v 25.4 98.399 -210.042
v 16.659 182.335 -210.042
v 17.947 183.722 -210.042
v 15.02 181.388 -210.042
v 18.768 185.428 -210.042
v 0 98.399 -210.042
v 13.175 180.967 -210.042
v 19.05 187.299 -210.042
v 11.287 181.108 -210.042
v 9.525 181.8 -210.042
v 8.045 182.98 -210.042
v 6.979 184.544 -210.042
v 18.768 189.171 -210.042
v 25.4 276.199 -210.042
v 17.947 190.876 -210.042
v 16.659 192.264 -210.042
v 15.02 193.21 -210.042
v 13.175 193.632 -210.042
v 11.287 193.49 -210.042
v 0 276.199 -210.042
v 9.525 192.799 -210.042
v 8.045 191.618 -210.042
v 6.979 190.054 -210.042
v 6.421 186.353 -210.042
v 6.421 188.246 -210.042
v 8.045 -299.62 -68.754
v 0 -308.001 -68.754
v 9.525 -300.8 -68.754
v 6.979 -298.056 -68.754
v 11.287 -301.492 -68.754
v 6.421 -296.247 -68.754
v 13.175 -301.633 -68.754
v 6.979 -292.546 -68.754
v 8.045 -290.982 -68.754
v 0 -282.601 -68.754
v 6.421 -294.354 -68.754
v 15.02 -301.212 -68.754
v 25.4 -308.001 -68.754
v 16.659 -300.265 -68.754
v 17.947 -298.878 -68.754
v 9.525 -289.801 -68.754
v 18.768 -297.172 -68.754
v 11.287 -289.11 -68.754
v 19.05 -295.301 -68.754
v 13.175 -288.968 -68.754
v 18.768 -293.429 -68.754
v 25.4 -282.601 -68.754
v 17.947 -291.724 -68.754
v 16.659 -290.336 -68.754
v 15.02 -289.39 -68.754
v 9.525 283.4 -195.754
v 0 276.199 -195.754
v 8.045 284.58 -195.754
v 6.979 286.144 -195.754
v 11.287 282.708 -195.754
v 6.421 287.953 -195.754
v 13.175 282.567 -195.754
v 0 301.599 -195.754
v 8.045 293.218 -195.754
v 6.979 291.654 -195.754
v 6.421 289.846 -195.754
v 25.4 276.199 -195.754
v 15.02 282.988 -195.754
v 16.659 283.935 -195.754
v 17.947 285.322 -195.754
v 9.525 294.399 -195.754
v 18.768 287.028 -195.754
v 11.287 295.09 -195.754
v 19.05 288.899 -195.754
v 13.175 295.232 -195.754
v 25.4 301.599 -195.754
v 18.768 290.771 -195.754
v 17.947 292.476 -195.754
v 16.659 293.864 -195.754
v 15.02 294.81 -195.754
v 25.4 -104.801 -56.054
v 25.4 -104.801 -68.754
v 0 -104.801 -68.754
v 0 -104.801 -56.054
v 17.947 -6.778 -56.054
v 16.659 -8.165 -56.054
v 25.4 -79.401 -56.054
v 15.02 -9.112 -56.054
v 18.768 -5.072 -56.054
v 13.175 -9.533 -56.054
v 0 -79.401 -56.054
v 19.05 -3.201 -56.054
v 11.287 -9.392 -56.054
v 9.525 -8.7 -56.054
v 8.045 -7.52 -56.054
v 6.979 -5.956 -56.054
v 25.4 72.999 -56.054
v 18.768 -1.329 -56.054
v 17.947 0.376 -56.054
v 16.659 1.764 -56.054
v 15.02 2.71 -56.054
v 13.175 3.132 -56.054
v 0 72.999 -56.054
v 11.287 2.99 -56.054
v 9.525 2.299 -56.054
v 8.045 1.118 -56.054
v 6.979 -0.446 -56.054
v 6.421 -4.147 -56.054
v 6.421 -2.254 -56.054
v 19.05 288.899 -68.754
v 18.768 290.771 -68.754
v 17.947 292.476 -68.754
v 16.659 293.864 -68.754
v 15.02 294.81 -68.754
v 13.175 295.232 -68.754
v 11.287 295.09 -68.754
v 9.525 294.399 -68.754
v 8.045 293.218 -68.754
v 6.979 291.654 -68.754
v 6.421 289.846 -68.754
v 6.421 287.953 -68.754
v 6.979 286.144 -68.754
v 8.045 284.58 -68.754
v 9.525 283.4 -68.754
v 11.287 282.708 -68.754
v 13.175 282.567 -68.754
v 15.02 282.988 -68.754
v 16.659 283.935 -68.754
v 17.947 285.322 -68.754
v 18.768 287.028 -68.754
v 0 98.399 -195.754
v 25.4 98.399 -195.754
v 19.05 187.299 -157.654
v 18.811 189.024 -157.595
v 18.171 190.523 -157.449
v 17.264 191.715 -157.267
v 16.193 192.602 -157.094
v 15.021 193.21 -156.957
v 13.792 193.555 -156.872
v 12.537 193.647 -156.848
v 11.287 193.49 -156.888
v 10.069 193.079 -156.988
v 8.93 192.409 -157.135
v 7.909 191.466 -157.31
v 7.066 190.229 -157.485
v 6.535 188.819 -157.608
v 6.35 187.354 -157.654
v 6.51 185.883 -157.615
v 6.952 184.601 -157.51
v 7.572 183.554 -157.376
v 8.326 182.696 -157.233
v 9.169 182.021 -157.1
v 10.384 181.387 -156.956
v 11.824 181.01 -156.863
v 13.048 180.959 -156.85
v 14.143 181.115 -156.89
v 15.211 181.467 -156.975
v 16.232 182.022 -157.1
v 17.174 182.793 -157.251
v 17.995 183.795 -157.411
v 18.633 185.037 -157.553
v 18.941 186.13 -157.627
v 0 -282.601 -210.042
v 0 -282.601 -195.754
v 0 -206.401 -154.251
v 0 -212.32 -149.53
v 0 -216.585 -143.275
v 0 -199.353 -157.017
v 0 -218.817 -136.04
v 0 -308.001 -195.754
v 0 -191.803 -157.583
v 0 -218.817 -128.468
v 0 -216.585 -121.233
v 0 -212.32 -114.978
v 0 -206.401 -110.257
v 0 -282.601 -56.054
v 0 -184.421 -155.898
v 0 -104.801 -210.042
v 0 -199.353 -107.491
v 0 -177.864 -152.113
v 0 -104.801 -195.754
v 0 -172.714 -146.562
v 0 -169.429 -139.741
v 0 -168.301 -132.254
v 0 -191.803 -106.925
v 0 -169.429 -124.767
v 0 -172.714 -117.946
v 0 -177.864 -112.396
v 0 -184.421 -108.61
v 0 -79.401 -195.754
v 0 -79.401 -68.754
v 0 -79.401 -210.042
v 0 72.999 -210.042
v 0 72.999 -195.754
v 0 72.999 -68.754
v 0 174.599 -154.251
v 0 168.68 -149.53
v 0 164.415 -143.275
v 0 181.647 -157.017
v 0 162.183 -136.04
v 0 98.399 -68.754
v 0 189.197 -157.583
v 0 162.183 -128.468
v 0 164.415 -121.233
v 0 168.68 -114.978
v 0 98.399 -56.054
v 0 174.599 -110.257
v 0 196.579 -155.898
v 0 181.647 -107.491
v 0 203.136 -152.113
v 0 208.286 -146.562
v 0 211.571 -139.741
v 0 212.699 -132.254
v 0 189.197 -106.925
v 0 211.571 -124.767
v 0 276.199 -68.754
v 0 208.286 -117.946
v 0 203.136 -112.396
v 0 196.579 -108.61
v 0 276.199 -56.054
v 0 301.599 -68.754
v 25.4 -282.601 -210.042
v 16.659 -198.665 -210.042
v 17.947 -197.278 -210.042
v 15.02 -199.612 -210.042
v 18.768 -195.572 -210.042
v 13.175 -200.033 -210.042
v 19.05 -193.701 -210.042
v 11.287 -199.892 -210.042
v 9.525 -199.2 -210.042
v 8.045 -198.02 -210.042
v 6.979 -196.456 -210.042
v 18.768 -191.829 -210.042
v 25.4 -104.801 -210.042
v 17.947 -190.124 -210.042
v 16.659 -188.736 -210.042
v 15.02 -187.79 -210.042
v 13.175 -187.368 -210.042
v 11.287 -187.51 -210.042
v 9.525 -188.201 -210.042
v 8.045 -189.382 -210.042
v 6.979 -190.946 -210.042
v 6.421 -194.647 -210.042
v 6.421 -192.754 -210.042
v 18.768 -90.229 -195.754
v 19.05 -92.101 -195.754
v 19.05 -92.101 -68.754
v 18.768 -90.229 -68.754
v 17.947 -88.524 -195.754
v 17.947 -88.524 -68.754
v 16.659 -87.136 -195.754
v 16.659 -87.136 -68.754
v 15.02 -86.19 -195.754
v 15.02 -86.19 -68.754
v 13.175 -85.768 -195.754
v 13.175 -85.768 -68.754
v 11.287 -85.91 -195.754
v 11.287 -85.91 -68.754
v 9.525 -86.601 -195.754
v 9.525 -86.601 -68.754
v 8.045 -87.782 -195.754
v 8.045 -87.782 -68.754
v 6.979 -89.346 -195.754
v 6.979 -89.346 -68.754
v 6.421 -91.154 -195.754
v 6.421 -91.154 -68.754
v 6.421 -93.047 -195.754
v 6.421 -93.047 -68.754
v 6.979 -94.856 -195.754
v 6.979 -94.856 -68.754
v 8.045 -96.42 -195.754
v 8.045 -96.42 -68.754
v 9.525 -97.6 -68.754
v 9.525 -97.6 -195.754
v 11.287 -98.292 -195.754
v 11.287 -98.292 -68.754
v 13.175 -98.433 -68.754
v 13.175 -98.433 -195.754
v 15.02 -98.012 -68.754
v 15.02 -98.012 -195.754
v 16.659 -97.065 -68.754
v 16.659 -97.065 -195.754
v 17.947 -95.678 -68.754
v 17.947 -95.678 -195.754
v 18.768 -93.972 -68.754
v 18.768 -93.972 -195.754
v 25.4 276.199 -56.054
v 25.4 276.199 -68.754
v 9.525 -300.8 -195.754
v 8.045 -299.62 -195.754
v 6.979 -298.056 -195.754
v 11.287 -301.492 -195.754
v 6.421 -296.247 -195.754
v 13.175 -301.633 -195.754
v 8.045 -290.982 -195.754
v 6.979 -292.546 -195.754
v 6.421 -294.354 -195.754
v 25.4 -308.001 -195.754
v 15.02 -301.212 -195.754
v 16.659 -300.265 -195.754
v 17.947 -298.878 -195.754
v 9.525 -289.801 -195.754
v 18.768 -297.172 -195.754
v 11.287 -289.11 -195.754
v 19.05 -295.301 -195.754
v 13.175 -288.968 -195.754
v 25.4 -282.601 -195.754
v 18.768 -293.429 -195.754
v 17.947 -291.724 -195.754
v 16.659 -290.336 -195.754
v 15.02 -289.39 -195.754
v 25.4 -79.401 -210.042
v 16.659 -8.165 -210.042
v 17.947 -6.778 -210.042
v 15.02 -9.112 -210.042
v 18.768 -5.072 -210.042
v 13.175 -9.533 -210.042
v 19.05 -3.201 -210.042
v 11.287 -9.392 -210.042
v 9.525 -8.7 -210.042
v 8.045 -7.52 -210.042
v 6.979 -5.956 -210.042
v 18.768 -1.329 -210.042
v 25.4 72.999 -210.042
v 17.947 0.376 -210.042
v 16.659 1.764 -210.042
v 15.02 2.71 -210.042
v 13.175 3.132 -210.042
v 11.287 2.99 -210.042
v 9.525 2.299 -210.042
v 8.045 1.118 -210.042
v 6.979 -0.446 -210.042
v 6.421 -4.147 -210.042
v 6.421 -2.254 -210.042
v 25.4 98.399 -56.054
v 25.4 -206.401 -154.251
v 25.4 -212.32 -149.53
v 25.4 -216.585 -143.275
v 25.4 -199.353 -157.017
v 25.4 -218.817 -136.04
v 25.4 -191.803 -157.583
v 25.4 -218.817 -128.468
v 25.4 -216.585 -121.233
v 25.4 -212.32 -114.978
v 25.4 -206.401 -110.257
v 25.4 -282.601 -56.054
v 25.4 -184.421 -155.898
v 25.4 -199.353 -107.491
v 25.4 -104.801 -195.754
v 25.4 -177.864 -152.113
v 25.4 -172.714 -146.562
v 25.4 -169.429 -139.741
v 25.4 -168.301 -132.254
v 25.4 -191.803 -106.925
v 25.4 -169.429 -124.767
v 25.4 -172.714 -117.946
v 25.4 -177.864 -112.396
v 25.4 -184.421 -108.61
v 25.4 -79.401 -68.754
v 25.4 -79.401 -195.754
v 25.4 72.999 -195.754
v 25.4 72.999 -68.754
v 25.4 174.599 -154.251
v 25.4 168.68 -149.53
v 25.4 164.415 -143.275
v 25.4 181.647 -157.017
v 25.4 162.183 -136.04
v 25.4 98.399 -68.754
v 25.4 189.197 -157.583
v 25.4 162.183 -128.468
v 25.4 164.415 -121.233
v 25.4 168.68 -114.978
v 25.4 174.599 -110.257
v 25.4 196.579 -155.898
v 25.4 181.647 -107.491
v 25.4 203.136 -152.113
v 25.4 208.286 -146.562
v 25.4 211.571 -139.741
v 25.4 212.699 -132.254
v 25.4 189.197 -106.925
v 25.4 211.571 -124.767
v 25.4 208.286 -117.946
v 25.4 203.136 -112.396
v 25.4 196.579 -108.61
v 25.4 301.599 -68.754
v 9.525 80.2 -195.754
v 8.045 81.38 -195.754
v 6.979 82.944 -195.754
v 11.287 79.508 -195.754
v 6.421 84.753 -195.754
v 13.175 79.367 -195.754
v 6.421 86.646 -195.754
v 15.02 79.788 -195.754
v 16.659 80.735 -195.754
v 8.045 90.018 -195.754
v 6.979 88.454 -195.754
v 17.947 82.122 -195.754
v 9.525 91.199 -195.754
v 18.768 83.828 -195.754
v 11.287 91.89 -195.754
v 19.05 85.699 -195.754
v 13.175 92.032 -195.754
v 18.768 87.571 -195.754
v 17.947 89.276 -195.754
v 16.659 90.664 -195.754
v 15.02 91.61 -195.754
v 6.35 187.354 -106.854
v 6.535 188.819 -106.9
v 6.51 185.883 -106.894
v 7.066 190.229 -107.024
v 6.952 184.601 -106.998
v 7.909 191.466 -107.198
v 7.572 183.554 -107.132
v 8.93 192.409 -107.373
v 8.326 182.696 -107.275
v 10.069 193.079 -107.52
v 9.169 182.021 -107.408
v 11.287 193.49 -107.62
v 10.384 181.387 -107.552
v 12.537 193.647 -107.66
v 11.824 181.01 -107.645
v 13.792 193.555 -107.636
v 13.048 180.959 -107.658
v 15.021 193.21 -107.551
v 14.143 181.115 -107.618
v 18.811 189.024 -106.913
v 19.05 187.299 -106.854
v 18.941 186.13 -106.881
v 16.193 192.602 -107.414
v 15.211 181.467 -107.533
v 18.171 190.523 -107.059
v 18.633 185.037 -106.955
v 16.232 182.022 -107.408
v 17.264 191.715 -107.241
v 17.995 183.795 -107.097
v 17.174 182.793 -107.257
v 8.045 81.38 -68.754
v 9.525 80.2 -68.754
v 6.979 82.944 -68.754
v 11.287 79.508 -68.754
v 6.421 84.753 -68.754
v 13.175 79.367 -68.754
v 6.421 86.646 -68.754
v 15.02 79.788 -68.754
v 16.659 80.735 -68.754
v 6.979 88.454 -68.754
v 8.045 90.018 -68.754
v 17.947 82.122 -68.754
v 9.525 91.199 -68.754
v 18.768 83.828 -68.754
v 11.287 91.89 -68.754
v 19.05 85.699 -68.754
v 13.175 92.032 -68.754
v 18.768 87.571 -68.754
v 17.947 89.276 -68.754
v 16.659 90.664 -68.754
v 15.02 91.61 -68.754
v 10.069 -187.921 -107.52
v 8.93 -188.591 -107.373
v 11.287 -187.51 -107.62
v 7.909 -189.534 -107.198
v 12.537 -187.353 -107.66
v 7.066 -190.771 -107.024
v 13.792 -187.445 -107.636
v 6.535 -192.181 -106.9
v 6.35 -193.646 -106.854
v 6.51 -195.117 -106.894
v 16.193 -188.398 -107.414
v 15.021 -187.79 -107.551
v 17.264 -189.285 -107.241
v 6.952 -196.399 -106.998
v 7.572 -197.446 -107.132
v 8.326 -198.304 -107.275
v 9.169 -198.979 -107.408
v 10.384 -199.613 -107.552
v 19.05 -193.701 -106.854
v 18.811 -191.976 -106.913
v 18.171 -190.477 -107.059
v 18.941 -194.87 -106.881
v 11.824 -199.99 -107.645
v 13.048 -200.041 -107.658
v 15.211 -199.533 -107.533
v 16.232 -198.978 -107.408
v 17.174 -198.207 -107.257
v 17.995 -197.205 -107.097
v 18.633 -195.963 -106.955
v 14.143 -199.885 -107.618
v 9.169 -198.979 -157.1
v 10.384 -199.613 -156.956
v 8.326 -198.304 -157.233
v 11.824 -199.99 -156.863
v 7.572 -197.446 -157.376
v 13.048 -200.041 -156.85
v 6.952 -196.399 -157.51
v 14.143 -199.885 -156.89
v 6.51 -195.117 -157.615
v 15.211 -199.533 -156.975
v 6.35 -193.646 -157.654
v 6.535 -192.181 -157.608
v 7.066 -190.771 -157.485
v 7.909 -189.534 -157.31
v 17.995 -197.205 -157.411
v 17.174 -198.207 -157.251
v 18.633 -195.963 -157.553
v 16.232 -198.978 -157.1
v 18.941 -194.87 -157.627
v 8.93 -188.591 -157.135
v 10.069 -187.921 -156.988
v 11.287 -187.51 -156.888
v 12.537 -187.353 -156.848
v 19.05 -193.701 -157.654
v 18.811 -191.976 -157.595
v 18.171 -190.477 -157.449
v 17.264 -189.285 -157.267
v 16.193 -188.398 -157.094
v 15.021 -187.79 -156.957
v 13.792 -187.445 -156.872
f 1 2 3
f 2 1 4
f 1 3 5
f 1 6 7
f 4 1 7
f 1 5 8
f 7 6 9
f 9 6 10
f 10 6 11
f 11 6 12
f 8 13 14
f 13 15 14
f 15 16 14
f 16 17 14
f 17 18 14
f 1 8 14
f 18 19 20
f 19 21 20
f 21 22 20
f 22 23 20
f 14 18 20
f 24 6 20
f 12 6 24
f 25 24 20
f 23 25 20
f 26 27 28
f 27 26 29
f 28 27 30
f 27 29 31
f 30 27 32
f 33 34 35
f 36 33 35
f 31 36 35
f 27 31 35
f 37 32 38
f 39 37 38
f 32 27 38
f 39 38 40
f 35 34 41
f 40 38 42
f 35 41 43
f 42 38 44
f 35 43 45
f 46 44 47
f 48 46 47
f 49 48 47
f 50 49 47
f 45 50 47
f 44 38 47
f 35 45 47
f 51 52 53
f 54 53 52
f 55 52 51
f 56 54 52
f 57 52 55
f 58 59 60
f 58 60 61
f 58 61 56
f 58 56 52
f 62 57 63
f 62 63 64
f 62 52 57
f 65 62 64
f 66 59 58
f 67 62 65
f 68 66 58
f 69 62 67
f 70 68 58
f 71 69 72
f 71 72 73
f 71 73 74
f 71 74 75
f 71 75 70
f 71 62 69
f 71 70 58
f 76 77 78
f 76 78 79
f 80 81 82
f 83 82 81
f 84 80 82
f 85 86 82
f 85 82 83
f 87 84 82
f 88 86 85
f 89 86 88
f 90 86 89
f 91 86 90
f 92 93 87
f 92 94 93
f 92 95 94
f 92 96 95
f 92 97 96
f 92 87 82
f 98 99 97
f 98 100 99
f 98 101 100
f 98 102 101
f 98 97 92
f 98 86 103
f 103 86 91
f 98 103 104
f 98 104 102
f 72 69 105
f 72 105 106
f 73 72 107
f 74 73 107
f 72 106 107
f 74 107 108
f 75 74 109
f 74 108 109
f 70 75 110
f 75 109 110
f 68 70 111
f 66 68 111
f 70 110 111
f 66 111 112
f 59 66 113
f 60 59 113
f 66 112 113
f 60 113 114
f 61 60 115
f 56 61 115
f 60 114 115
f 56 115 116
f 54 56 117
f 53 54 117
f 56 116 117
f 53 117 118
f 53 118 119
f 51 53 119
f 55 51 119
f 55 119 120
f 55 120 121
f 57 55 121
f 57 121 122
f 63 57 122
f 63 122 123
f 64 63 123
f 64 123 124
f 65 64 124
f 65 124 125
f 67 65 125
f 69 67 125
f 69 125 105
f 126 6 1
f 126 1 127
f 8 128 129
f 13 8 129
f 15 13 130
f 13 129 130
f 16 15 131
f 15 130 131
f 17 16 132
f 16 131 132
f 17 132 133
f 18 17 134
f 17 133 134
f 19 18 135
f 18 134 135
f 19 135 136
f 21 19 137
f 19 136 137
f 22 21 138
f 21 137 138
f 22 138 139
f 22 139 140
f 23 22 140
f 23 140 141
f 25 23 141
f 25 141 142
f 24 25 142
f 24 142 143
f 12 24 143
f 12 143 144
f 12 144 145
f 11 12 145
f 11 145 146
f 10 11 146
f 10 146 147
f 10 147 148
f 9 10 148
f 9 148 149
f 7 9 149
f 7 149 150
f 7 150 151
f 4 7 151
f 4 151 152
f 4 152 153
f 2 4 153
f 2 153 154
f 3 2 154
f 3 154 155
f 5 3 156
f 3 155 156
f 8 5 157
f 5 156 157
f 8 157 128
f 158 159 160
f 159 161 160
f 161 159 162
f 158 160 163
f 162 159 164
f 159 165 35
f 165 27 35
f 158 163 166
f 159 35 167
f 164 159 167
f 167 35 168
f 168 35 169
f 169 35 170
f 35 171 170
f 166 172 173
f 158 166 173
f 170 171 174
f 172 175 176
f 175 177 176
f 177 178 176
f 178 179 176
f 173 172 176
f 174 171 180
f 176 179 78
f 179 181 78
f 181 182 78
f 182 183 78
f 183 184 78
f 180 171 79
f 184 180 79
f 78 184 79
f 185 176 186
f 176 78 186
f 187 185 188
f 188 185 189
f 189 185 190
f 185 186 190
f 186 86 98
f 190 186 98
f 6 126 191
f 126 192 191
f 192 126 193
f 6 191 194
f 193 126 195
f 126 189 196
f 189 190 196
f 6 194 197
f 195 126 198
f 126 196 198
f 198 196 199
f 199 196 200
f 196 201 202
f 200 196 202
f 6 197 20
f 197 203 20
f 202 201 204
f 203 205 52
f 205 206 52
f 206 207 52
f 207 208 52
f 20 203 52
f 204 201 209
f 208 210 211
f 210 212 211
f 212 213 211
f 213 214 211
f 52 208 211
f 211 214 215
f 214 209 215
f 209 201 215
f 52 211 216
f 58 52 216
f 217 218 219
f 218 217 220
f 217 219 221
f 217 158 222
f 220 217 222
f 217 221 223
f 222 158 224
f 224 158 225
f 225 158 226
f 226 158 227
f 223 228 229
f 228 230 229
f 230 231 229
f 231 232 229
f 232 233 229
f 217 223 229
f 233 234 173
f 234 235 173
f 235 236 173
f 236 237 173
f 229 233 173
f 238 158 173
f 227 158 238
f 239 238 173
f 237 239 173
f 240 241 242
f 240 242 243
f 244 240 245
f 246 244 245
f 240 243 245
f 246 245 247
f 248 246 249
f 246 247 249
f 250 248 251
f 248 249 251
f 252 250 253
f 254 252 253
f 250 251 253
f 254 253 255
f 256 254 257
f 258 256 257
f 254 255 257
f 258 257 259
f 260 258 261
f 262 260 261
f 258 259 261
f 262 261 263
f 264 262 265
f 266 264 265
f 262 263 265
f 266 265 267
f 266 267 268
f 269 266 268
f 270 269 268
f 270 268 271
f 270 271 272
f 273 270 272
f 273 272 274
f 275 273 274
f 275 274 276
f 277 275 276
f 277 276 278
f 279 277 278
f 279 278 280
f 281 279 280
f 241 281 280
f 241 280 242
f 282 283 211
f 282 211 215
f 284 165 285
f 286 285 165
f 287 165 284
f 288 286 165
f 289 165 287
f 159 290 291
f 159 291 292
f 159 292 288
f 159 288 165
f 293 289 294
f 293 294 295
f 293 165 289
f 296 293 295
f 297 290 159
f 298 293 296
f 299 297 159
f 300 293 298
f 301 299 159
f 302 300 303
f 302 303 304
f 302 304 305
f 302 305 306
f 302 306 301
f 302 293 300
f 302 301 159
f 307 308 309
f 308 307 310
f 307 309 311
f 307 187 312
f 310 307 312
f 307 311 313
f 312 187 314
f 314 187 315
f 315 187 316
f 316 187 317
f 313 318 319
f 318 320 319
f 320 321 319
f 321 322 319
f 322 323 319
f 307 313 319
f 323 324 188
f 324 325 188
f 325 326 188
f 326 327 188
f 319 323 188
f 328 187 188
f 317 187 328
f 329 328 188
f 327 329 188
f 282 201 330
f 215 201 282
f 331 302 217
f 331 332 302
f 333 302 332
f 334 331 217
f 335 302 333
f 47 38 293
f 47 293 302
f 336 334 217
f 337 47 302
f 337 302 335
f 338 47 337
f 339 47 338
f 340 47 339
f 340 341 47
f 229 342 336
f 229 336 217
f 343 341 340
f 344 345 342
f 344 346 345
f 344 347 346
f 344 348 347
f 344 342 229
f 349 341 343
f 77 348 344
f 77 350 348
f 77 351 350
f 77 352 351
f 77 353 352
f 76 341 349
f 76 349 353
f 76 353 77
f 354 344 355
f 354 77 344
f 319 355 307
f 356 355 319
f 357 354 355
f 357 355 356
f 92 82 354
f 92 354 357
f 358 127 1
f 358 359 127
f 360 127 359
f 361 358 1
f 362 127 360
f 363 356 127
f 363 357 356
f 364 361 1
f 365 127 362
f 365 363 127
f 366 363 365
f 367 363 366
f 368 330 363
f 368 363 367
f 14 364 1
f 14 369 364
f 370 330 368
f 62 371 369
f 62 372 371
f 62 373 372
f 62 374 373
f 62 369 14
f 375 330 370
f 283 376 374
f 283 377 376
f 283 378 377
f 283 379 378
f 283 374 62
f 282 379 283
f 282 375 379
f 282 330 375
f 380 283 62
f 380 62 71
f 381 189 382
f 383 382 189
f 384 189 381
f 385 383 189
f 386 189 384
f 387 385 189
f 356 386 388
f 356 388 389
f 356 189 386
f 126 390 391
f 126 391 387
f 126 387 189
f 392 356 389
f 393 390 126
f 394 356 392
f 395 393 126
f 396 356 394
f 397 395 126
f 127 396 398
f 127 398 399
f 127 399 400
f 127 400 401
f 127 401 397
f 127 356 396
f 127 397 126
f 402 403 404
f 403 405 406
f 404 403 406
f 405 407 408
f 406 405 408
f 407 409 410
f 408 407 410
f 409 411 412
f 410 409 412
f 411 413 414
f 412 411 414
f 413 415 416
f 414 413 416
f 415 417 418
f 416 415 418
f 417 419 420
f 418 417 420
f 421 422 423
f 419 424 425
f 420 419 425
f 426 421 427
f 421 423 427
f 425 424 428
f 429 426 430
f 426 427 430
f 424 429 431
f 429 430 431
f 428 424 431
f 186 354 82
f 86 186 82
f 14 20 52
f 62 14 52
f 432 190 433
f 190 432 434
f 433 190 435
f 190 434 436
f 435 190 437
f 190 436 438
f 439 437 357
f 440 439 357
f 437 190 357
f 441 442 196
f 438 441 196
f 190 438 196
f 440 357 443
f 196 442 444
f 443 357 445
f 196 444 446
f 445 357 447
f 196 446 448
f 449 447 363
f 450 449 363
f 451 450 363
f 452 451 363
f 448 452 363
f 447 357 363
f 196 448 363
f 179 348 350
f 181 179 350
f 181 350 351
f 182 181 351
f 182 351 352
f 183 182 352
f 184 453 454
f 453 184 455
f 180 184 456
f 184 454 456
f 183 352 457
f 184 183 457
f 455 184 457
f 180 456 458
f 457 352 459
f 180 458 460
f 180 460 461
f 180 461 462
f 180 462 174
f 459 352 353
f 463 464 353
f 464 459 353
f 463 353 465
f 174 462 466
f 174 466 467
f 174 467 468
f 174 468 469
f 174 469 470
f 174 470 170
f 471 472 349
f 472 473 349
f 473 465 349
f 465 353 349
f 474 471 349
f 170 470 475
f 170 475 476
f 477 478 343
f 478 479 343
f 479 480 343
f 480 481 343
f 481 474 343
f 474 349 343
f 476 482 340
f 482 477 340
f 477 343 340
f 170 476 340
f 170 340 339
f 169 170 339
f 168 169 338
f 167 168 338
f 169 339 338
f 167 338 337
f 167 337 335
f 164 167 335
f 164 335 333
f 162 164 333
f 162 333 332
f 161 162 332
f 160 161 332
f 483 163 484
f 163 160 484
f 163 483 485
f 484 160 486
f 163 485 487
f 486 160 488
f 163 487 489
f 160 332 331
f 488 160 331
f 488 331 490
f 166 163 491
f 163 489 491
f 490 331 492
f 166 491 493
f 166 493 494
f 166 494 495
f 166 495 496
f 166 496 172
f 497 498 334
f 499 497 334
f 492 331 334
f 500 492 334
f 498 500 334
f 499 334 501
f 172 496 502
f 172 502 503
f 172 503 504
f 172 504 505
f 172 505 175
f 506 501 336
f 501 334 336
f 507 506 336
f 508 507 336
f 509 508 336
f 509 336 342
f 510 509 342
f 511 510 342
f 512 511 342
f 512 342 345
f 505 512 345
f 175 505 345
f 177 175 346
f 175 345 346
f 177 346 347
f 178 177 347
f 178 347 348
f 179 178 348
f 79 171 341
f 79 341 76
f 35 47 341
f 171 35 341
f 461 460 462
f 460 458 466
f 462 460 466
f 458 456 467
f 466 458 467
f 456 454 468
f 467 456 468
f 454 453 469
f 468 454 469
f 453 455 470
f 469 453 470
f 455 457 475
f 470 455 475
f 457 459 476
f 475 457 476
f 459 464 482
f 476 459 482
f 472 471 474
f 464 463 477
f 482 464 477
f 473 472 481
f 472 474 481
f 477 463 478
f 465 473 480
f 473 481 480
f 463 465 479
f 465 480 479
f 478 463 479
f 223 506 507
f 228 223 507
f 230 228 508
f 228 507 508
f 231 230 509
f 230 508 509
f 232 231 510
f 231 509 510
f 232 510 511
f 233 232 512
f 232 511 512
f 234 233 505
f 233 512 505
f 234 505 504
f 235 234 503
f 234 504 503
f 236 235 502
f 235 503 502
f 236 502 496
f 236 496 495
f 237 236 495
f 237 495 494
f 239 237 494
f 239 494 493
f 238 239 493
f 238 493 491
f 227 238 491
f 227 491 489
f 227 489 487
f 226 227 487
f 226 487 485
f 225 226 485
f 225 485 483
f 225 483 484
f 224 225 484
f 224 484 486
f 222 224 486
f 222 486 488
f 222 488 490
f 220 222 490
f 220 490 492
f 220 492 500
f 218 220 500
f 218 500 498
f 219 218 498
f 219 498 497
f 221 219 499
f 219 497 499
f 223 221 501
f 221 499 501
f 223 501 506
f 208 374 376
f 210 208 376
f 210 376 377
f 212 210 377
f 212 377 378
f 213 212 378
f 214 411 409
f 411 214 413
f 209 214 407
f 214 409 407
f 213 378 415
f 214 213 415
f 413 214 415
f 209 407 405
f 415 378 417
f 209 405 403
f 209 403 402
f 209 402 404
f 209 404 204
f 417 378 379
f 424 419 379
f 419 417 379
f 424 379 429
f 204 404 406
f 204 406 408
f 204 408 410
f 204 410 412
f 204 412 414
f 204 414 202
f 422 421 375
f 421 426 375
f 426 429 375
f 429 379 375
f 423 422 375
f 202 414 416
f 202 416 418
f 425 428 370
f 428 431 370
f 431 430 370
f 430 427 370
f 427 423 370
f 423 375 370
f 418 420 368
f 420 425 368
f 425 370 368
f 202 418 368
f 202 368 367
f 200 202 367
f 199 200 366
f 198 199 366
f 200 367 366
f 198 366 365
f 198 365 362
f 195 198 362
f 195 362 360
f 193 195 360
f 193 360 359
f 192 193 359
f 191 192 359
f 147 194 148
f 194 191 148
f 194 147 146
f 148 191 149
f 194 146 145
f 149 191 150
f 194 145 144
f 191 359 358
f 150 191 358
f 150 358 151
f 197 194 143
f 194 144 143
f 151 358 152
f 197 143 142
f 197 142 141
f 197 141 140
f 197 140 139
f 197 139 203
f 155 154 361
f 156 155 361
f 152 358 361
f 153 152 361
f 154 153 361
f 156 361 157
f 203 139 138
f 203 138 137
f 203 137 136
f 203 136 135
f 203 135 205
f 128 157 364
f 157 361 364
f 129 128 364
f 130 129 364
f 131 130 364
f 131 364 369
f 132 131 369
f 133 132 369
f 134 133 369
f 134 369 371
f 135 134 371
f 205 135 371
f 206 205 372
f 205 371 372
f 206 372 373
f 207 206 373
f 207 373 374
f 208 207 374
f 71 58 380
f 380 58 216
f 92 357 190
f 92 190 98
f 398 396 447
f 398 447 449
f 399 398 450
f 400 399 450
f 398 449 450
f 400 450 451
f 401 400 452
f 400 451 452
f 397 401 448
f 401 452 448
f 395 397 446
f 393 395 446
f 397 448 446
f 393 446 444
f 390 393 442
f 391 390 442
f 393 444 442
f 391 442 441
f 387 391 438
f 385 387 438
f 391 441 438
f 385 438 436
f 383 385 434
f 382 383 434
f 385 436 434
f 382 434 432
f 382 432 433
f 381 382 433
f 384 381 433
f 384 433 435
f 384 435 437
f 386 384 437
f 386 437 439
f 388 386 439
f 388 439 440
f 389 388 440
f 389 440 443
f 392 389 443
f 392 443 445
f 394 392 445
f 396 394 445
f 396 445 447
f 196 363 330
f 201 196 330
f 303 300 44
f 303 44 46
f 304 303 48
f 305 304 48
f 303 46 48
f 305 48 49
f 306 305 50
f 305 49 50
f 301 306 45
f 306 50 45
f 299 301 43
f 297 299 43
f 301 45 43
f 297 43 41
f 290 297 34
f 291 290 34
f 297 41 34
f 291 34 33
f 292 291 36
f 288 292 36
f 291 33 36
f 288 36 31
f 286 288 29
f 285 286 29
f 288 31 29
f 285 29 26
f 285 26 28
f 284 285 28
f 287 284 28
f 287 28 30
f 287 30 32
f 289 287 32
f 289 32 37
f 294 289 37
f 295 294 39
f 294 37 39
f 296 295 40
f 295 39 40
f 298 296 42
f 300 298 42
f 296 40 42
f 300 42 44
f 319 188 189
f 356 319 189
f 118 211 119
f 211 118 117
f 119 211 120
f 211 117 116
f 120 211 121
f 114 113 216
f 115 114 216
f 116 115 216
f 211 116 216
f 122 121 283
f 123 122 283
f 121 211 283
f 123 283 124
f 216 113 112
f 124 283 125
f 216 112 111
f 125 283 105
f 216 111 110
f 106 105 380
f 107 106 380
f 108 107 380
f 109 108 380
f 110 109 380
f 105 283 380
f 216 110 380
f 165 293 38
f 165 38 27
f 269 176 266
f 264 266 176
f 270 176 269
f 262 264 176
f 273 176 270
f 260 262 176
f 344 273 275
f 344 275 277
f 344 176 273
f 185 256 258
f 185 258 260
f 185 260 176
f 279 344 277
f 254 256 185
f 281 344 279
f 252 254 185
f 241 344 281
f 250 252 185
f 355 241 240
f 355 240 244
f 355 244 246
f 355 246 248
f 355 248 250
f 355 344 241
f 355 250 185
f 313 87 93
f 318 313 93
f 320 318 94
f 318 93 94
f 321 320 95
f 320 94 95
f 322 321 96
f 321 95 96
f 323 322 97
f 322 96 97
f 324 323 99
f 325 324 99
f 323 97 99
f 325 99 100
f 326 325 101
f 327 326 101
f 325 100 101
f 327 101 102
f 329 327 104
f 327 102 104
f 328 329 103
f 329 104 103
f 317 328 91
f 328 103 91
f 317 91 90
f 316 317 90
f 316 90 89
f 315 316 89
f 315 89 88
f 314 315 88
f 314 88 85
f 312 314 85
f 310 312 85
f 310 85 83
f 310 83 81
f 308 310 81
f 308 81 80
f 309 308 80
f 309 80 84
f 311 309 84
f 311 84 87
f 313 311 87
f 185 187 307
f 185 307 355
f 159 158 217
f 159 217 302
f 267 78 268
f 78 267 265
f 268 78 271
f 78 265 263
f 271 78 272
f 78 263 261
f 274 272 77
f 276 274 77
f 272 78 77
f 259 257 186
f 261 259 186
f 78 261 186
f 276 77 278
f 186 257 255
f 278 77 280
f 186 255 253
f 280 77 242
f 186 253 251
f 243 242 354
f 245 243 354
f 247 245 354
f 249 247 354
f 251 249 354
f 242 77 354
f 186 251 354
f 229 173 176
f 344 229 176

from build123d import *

# Parameters (mm, degrees)
F0_W      = 609.6
F0_H      = 153.9875
F1_DEPTH  = 25.4
F2_W      = 25.4
F2_H      = 12.7
F2_H_2    = 15.875
F3_DEPTH  = 25.4
F7_R      = 6.35
F6_R      = 6.35
F5_R      = 6.35
F4_R      = 6.35
F8_DEPTH  = 177.8
F9_DEPTH  = 1.5875
F12_R     = 6.35
F11_R     = 6.35
F10_R     = 6.35
F13_DEPTH = 177.8
F14_R     = 25.4
F15_DEPTH = 25.4
F16_DEPTH = 76.2
F17_DEPTH = 25.4


with BuildPart() as f1:
    # F0 (on Right) → F1 (new body)
    with BuildSketch(Plane.YZ):
        with Locations((-3.2007116824, -133.0477804439)):
            Rectangle(F0_W, F0_H)
    extrude(amount=F1_DEPTH)

    # F2 (on face) → F3 (cut)
    with BuildSketch(Plane.YZ.offset(25.4)):
        with Locations((-295.3007116824, -62.4040304439)):
            Rectangle(F2_W, F2_H)
        with Locations((-295.3007116824, -202.1040304439)):
            Rectangle(F2_W, F2_H_2)
        with Locations((-92.1007116824, -202.1040304439)):
            Rectangle(F2_W, F2_H_2)
        with Locations((-92.1007116824, -62.4040304439)):
            Rectangle(F2_W, F2_H)
        with Locations((85.6992883176, -62.4040304439)):
            Rectangle(F2_W, F2_H)
        with Locations((85.6992883176, -202.1040304439)):
            Rectangle(F2_W, F2_H_2)
        with Locations((288.8992883176, -62.4040304439)):
            Rectangle(F2_W, F2_H)
        with Locations((288.8992883176, -202.1040304439)):
            Rectangle(F2_W, F2_H_2)
    extrude(amount=-F3_DEPTH, mode=Mode.SUBTRACT)

    # F7 (on face) + F6 (on face) + F5 (on face) + F4 (on face) → F8 (cut)
    with BuildSketch(Plane.XY.offset(-68.7540304439)):
        with Locations((12.7, 288.8992883176)):
            Circle(F7_R)
    with BuildSketch(Plane.XY.offset(-68.7540304439)):
        with Locations((12.7, 85.6992883176)):
            Circle(F6_R)
    with BuildSketch(Plane.XY.offset(-68.7540304439)):
        with Locations((12.7, -92.1007116824)):
            Circle(F5_R)
    with BuildSketch(Plane.XY.offset(-68.7540304439)):
        with Locations((12.7, -295.3007116824)):
            Circle(F4_R)
    extrude(amount=-F8_DEPTH, mode=Mode.SUBTRACT)

    # F9 (add): faces of the model
    f9_faces = [f1.faces().sort_by_distance(p)[0] for p in [
        (12.7, -282.9599219273, -194.1665304439),
        (12.7, -79.7599219273, -194.1665304439),
        (12.7, 98.0400780727, -194.1665304439),
        (12.7, 301.2400780727, -194.1665304439),
    ]]
    extrude(f9_faces, amount=F9_DEPTH)

    # F12 (on face) + F11 (on face) + F10 (on face) → F13 (cut)
    with BuildSketch(Plane.XY.offset(-56.0540304439)):
        with Locations((12.7, -193.7007116824)):
            Circle(F12_R)
    with BuildSketch(Plane.XY.offset(-56.0540304439)):
        with Locations((12.7, -3.2007116824)):
            Circle(F11_R)
    with BuildSketch(Plane.XY.offset(-56.0540304439)):
        with Locations((12.7, 187.2992883176)):
            Circle(F10_R)
    extrude(amount=-F13_DEPTH, mode=Mode.SUBTRACT)

    # F14 (on face) → F15 (cut)
    with BuildSketch(Plane.YZ.offset(25.4)):
        with Locations((-193.7007116824, -132.2540304439)):
            Circle(F14_R)
        with Locations((187.2992883176, -132.2540304439)):
            Circle(F14_R)
    extrude(amount=-F15_DEPTH, mode=Mode.SUBTRACT)

    # F12 (on face) + F10 (on face) → F16 (join)
    with BuildSketch(Plane.XY.offset(-56.0540304439)):
        with Locations((12.7, -193.7007116824)):
            Circle(F12_R)
    with BuildSketch(Plane.XY.offset(-56.0540304439)):
        with Locations((12.7, 187.2992883176)):
            Circle(F10_R)
    extrude(amount=-F16_DEPTH)

    # F14 (on face) → F17 (cut)
    with BuildSketch(Plane.YZ.offset(25.4)):
        with Locations((-193.7007116824, -132.2540304439)):
            Circle(F14_R)
        with Locations((187.2992883176, -132.2540304439)):
            Circle(F14_R)
    extrude(amount=-F17_DEPTH, mode=Mode.SUBTRACT)


solid = f1.part
